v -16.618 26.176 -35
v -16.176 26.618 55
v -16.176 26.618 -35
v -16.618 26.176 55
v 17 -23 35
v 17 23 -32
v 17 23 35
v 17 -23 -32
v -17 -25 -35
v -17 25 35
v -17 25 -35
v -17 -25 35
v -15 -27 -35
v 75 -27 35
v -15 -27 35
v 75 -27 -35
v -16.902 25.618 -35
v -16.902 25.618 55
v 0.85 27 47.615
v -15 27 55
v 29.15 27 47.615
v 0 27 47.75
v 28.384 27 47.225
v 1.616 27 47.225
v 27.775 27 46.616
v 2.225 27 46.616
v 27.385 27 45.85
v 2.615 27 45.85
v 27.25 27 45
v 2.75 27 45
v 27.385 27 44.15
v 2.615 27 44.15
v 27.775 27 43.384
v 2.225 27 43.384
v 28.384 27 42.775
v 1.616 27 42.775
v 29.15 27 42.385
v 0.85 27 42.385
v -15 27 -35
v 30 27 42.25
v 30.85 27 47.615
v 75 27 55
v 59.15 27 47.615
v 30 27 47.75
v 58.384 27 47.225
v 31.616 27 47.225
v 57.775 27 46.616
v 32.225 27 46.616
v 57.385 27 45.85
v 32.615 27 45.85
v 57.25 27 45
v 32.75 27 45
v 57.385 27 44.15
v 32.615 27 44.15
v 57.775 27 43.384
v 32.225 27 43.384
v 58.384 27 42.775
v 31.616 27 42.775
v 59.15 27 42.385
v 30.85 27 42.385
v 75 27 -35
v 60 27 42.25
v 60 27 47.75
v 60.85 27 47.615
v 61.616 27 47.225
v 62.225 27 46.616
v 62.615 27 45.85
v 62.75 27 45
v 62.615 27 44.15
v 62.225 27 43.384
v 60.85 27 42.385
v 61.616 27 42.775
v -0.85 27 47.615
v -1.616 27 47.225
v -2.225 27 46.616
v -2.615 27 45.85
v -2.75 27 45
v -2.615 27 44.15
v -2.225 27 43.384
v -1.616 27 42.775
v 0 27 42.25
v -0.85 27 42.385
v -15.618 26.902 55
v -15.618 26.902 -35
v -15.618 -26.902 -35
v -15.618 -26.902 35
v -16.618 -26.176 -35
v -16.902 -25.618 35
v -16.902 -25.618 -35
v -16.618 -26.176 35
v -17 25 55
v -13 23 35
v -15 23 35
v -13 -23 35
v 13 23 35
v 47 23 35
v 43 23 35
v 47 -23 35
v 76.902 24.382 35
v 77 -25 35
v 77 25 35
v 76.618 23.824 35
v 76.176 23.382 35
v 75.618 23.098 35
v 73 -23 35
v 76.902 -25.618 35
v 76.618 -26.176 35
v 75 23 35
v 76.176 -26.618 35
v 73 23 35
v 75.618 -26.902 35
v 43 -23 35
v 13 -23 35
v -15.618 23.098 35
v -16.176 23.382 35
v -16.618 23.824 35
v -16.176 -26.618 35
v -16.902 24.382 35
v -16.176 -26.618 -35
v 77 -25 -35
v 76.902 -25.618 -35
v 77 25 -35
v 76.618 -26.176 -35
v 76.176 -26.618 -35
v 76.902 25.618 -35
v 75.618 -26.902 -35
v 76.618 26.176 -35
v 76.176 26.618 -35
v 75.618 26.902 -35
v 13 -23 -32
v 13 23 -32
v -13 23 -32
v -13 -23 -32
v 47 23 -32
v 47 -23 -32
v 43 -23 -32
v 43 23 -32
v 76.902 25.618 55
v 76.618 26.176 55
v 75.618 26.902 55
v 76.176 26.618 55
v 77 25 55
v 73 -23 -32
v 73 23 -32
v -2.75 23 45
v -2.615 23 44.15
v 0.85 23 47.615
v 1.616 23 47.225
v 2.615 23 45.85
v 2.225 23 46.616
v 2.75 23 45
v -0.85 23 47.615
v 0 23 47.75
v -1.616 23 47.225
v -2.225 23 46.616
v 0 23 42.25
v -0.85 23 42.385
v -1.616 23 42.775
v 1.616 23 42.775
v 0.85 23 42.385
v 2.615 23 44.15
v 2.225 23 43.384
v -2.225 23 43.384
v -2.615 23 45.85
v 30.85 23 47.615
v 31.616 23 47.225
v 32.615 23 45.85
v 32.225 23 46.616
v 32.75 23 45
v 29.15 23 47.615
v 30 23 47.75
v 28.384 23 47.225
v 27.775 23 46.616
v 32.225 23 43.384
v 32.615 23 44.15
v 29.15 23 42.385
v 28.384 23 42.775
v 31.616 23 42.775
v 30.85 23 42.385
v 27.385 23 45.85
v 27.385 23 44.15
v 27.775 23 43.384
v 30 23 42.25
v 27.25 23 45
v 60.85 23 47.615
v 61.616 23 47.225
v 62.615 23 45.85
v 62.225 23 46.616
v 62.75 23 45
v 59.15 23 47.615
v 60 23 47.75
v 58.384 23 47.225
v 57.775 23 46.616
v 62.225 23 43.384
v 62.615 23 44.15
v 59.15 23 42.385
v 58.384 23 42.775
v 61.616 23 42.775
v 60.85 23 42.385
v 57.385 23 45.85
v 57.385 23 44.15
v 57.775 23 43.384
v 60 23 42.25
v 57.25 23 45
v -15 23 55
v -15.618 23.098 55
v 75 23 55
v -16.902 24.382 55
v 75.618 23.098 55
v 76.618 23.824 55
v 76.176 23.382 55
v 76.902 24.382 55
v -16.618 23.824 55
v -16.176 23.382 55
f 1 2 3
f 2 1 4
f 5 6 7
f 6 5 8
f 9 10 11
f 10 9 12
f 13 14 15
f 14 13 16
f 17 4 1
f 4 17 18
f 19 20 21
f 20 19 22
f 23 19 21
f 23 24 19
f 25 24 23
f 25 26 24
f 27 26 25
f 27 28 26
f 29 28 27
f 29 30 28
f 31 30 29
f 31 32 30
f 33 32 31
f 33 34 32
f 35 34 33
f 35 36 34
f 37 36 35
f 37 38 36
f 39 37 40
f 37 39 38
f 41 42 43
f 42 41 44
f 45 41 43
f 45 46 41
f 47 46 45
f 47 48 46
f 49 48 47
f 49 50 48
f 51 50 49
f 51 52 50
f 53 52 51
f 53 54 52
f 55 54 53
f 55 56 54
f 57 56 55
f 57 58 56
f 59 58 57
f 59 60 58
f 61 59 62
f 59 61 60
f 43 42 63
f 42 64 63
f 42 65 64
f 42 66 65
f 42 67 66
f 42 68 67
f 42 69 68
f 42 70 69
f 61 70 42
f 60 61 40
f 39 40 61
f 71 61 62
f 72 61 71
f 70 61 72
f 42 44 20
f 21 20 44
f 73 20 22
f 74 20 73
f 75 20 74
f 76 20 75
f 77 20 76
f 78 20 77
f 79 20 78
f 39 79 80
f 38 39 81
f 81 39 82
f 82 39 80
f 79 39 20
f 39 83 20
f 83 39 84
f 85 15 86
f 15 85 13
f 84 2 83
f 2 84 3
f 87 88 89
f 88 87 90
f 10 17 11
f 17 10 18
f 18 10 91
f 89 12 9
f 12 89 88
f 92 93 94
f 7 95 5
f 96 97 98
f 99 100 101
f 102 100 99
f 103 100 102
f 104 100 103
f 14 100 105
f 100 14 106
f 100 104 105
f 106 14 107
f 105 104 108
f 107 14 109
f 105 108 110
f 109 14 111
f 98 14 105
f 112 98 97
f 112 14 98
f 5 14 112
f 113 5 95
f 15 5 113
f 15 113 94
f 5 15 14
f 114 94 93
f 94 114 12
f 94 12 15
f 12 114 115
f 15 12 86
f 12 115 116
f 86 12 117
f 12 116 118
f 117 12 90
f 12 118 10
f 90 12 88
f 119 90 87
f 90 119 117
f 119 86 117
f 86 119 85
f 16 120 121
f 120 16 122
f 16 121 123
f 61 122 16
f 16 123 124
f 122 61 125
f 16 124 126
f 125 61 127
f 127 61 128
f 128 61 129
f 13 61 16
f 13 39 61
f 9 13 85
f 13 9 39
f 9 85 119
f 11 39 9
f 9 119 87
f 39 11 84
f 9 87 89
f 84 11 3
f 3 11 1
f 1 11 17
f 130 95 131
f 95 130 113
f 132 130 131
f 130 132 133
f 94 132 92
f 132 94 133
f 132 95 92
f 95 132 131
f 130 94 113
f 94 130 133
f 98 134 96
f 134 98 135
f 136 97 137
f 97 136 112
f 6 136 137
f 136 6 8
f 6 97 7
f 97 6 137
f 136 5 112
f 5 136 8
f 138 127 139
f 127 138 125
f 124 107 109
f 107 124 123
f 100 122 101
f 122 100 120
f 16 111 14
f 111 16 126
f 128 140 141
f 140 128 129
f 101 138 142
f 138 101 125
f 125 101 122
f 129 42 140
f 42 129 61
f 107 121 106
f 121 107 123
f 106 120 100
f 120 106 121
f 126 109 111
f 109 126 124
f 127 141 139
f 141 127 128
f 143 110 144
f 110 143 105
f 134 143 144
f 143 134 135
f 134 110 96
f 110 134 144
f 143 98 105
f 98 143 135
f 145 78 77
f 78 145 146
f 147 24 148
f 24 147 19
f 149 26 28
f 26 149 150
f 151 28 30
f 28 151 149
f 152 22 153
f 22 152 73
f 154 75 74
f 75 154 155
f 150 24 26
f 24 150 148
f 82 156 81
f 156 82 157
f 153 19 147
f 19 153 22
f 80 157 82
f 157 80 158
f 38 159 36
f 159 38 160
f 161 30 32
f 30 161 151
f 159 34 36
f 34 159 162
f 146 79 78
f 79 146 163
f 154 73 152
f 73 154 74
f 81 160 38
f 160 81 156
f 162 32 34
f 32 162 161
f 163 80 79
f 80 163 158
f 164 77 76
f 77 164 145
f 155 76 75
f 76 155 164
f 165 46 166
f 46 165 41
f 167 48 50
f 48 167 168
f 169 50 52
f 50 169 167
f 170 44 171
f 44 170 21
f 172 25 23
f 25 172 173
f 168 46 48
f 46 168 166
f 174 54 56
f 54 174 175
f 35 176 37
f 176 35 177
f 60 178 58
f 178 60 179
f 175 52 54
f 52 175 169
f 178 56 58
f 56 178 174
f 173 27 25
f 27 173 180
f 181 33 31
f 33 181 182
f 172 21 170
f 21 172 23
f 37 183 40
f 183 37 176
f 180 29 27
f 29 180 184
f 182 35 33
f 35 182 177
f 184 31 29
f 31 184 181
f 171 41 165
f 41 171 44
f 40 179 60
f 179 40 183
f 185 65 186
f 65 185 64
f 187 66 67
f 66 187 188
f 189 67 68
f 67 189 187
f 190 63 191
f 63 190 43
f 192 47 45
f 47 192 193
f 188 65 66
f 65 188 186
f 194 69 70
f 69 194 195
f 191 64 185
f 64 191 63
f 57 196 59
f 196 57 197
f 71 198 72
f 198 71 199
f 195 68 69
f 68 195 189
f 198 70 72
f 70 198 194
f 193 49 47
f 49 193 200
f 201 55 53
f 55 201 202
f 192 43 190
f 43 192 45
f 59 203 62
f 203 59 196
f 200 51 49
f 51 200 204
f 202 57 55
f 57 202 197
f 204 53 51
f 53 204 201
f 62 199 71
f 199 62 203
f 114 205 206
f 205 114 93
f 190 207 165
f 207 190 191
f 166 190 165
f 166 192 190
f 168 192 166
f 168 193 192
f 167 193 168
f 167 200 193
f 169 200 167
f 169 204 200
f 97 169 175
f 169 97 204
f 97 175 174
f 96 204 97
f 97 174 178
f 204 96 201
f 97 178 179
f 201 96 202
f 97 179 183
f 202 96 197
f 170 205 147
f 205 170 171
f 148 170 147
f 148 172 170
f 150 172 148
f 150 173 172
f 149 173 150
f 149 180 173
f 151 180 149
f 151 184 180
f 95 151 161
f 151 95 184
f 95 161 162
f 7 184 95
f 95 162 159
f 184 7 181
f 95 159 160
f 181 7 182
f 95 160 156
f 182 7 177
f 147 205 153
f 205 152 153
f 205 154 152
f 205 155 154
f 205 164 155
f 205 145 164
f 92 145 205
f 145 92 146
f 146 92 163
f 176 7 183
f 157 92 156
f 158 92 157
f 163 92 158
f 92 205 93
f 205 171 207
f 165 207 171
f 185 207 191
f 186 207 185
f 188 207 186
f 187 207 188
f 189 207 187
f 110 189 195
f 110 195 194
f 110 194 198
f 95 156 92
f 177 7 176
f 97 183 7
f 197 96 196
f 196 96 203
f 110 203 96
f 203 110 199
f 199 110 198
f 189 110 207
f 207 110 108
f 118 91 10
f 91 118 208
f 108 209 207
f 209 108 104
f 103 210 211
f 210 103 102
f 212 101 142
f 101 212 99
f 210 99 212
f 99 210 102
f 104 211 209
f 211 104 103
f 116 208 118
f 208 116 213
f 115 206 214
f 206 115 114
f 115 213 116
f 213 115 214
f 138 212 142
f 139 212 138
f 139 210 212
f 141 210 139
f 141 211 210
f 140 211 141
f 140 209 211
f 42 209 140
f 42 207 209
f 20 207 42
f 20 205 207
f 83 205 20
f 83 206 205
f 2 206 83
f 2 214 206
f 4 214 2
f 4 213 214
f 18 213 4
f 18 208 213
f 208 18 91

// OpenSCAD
/***********************************************************************
Name ......... : parametricHangingStorageBox.scad
Description....: Parametric Hanging Storage Box
Author ....... : Garrett Melenka
Version ...... : V1.0 2016/05/21
Licence ...... : GPL
***********************************************************************/

//Thickness of Bin Dividers
dividerThickness = 2;
//Width of Each Bin
binWidth = 30;
//Height of Each Bin
binHeight = 70;
//Depth of Each Bin
binDepth = 50;
//Height of back mounting plate above bin
backHeight = 20;
//Diameter of Mounting Holes
mountHoleDiameter = 5.5;
//Radius of bin cornder
cornerRadius = dividerThickness;
//Thickness of Mounting Plate
mountingBackThickness = dividerThickness;
//Specify Number of Bins
numberOfBins = 3;

numberOfMountHoles = numberOfBins;



module hangingToolHolderBin()
{
    difference()
    {
    hull(){
    
    cube(size = [binWidth, binDepth, binHeight], center = true);
    
    
    
    translate([-binWidth*0.5,-binDepth*0.5, 0]){
    cylinder(r = cornerRadius, h = binHeight, center = true);
    }
    
    translate([binWidth*0.5,-binDepth*0.5, 0]){
    cylinder(r = cornerRadius, h = binHeight, center = true);
    }
    
    translate([binWidth*0.5,binDepth*0.5, 0]){
    cylinder(r = cornerRadius, h = binHeight, center = true);
    }
    
    translate([-binWidth*0.5,binDepth*0.5, 0]){
    cylinder(r = cornerRadius, h = binHeight, center = true);
    }
    }
    
    
    translate([0,0,dividerThickness]){    
    cube(size = [binWidth - dividerThickness*2, binDepth-dividerThickness*2, binHeight-dividerThickness], center = true);
    }
    }
    
    
}

module hangingToolHolder()
{
    
    if(numberOfBins >=1)
    {
    union()
    {
    for (i = [0:1:numberOfBins-1])
    {
        
        translate([i*binWidth, 0,0])
        {
        hangingToolHolderBin();
        }
        
        
    }
    
    difference(){
    translate([binWidth*numberOfBins*0.5-binWidth*0.5,binDepth*0.5-cornerRadius*0.5,binHeight*0.5+backHeight*0.5])
        {
    
    hull(){    
    cube(size = [binWidth*numberOfBins, mountingBackThickness, backHeight], center = true);
    translate([-binWidth*numberOfBins*0.5,mountingBackThickness*0.5, 0]){    
    cylinder(r = cornerRadius, h = backHeight, center = true);
    }
    translate([binWidth*numberOfBins*0.5,mountingBackThickness*0.5, 0]){    
    cylinder(r = cornerRadius, h = backHeight, center = true);
    }
    }    
    }
    
    for (i = [0:1:numberOfMountHoles-1])
    {
    translate([i*binWidth,binDepth*0.5, backHeight*0.5+binHeight*0.5]){
    rotate([90,0,0])
    {
    cylinder(r=mountHoleDiameter*0.5, h = mountingBackThickness+cornerRadius*2, center = true);
    }
    }
    }
    }
    }
    }
    else
    {
        echo("Zero bins not possible!");
    }
}


$fn = 20;
hangingToolHolder();
